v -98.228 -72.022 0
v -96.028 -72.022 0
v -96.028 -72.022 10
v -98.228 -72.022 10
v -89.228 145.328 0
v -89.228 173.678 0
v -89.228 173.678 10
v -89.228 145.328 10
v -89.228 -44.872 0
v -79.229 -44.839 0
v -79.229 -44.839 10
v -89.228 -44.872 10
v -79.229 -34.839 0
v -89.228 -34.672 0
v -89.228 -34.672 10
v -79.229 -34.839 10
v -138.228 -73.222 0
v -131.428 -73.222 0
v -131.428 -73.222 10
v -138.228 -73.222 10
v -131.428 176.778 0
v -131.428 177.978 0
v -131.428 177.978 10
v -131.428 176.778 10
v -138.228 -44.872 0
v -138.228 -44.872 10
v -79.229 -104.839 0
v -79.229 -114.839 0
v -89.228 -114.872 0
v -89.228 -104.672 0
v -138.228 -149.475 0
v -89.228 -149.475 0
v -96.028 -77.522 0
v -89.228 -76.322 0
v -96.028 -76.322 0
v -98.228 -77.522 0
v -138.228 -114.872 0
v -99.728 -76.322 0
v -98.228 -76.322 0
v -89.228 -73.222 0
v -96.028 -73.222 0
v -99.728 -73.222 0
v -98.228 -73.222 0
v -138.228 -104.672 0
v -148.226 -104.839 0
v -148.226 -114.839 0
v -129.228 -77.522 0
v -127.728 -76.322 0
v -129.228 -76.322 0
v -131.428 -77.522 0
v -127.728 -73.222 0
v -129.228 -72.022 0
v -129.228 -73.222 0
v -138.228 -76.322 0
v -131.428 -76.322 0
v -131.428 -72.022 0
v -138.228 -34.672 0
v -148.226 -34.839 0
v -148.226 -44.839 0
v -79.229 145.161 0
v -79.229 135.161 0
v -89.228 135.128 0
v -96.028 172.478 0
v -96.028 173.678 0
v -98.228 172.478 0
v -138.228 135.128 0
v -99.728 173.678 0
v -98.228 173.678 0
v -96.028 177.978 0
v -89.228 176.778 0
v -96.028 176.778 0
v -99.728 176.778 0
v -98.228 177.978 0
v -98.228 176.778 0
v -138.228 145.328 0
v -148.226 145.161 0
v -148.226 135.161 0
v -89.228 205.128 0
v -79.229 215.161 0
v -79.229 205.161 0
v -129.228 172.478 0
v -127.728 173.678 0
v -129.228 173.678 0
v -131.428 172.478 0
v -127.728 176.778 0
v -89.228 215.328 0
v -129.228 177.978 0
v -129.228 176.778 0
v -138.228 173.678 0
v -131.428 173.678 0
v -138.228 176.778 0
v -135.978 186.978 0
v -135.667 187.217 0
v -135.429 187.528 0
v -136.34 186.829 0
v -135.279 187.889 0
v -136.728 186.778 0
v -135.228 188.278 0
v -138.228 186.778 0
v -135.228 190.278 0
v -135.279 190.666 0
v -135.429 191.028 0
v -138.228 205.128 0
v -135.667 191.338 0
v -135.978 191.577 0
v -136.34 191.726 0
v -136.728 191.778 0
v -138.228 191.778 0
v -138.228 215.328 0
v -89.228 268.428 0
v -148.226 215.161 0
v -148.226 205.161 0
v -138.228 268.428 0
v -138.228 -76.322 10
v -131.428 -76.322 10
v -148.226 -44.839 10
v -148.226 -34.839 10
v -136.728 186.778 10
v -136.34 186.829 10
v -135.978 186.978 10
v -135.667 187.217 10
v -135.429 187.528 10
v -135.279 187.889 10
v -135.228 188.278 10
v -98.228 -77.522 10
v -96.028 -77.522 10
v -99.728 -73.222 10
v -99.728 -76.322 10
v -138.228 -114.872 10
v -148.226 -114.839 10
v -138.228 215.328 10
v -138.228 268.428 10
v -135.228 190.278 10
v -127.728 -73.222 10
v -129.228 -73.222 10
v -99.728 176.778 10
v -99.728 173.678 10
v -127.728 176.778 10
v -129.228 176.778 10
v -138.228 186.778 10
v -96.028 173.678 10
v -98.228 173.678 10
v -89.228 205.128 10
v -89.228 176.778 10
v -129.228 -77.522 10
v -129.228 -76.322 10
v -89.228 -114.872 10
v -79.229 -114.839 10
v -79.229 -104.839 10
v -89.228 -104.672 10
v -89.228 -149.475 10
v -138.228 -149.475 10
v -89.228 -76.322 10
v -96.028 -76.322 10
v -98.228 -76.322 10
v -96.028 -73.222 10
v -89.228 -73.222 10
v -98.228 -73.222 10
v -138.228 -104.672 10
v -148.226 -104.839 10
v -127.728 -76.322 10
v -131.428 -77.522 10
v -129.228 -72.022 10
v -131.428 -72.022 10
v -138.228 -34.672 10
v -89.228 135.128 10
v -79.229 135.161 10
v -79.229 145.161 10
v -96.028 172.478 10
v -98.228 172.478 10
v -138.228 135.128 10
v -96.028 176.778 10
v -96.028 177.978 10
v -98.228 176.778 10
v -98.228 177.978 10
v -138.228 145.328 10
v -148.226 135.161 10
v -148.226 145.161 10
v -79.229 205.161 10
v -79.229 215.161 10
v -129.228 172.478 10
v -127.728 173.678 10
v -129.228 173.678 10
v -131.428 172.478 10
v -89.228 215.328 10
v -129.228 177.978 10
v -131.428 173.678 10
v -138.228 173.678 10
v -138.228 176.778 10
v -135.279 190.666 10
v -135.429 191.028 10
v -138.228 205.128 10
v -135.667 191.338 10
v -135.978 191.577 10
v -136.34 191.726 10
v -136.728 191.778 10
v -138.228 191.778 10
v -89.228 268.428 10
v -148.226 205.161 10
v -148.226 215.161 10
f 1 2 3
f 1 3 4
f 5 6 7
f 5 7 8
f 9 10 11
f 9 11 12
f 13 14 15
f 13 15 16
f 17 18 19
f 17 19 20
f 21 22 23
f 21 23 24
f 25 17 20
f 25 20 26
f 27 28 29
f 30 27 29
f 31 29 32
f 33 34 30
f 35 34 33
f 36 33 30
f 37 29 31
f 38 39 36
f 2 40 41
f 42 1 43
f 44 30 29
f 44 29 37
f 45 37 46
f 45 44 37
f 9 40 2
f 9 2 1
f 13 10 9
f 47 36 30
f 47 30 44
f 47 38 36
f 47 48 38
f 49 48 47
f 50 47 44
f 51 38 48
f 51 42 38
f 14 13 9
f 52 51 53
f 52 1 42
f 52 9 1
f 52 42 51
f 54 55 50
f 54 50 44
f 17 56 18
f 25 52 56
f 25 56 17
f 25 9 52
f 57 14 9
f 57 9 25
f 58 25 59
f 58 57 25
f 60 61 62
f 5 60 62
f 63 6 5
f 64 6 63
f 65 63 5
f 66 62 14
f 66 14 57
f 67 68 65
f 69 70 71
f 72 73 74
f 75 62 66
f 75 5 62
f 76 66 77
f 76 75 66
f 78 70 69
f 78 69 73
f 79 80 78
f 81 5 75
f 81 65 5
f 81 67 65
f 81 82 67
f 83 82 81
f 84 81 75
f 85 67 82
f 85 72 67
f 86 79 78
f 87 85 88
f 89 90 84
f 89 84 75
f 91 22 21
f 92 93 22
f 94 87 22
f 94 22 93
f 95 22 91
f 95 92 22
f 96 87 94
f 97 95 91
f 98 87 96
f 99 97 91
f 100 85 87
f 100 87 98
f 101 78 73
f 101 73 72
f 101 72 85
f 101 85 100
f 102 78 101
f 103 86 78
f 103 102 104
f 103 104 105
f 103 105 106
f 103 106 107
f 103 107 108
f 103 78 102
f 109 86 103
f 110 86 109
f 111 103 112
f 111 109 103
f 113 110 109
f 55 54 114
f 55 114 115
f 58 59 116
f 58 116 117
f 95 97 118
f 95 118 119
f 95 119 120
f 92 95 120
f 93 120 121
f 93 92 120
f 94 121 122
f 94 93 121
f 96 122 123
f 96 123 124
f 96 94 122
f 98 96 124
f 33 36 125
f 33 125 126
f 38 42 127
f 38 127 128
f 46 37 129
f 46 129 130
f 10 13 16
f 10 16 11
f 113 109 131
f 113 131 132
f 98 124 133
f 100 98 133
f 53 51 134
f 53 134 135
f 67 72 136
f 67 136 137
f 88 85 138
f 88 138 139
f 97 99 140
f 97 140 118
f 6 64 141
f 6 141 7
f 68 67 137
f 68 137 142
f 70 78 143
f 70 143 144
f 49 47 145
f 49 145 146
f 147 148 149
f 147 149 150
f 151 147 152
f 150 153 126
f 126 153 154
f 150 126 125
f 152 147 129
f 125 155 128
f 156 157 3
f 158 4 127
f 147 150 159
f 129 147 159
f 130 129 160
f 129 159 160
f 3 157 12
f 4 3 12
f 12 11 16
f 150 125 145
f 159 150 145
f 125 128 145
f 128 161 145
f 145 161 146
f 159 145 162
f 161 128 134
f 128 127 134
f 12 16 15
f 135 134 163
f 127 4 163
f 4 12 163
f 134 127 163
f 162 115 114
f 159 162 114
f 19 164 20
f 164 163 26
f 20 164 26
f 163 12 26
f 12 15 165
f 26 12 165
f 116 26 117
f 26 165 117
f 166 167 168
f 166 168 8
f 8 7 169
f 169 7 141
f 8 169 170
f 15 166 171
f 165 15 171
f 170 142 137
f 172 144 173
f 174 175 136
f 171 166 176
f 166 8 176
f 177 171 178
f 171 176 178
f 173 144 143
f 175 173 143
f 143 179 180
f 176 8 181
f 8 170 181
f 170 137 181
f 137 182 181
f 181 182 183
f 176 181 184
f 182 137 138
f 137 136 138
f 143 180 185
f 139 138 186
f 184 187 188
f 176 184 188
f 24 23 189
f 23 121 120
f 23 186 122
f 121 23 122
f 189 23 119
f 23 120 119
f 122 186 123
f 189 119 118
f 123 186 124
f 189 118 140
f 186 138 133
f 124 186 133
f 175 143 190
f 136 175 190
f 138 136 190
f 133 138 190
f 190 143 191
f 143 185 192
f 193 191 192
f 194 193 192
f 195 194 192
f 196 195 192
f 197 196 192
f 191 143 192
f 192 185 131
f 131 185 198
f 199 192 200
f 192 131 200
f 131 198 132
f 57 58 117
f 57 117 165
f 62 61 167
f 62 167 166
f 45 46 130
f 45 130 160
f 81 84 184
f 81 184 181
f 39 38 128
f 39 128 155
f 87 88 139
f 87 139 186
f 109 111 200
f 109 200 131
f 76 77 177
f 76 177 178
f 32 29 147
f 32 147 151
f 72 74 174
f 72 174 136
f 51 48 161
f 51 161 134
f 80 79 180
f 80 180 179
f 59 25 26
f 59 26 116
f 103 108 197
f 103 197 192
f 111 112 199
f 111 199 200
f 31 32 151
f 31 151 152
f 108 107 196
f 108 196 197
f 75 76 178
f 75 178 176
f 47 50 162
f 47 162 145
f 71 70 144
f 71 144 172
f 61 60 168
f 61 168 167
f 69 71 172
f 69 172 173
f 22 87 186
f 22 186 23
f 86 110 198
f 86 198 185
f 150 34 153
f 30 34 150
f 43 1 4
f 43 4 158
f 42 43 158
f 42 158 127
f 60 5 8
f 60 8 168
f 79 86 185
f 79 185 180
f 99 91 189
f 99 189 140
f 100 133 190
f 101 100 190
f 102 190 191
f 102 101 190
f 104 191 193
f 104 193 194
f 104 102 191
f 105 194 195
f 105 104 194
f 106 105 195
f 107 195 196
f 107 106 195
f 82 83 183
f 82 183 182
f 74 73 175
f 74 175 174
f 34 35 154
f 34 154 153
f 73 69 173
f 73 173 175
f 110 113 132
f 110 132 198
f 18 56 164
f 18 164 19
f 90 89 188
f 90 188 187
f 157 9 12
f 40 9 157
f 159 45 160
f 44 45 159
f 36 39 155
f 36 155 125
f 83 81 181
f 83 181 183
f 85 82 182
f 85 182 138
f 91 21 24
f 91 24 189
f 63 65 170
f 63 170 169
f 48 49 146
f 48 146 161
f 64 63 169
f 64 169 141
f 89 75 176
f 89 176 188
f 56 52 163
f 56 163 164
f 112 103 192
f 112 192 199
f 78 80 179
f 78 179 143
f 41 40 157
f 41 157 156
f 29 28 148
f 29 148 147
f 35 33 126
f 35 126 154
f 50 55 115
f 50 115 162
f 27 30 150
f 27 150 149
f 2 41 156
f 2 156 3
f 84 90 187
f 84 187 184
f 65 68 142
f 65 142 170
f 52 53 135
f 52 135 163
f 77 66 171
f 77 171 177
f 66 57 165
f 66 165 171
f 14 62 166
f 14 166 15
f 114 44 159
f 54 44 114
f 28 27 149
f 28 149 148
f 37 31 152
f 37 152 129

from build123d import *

# Parameters (mm, degrees)
EXTRUDE_1_DEPTH = 10


with BuildPart() as part:
    # Эскиз2 → Бобышка-Вытянуть1 (new body)
    with BuildSketch(Plane.XY):
        with BuildLine():
            Line((-89.227881483, -149.474789065), (-138.227881483, -149.474789065))
            Line((-138.227881483, -149.474789065), (-138.227881483, -114.872465065))
            Line((-138.227881483, -114.872465065), (-148.226492884, -114.839108588))
            Line((-148.226492884, -114.839108588), (-148.226492884, -104.839108588))
            Line((-148.226492884, -104.839108588), (-138.227881483, -104.672465065))
            Line((-138.227881483, -104.672465065), (-138.227881483, -76.322465065))
            Line((-138.227881483, -76.322465065), (-131.427881483, -76.322465065))
            Line((-131.427881483, -76.322465065), (-131.427881483, -77.522465065))
            Line((-131.427881483, -77.522465065), (-129.227881483, -77.522465065))
            Line((-129.227881483, -77.522465065), (-129.227881483, -76.322465065))
            Line((-129.227881483, -76.322465065), (-127.727881483, -76.322465065))
            Line((-127.727881483, -76.322465065), (-127.727881483, -73.222465065))
            Line((-127.727881483, -73.222465065), (-129.227881483, -73.222465065))
            Line((-129.227881483, -73.222465065), (-129.227881483, -72.022465065))
            Line((-129.227881483, -72.022465065), (-131.427881483, -72.022465065))
            Line((-131.427881483, -72.022465065), (-131.427881483, -73.222465065))
            Line((-131.427881483, -73.222465065), (-138.227881483, -73.222465065))
            Line((-138.227881483, -73.222465065), (-138.227881483, -44.872465065))
            Line((-138.227881483, -44.872465065), (-148.226492884, -44.839108588))
            Line((-148.226492884, -44.839108588), (-148.226492884, -34.839108588))
            Line((-148.226492884, -34.839108588), (-138.227881483, -34.672465065))
            Line((-138.227881483, -34.672465065), (-138.227881483, 135.127534935))
            Line((-138.227881483, 135.127534935), (-148.226492884, 135.160891412))
            Line((-148.226492884, 135.160891412), (-148.226492884, 145.160891412))
            Line((-148.226492884, 145.160891412), (-138.227881483, 145.327534935))
            Line((-138.227881483, 145.327534935), (-138.227881483, 173.677534935))
            Line((-138.227881483, 173.677534935), (-131.427881483, 173.677534935))
            Line((-131.427881483, 173.677534935), (-131.427881483, 172.477534935))
            Line((-131.427881483, 172.477534935), (-129.227881483, 172.477534935))
            Line((-129.227881483, 172.477534935), (-129.227881483, 173.677534935))
            Line((-129.227881483, 173.677534935), (-127.727881483, 173.677534935))
            Line((-127.727881483, 173.677534935), (-127.727881483, 176.777534935))
            Line((-127.727881483, 176.777534935), (-129.227881483, 176.777534935))
            Line((-129.227881483, 176.777534935), (-129.227881483, 177.977534935))
            Line((-129.227881483, 177.977534935), (-131.427881483, 177.977534935))
            Line((-131.427881483, 177.977534935), (-131.427881483, 176.777534935))
            Line((-131.427881483, 176.777534935), (-138.227881483, 176.777534935))
            Line((-138.227881483, 176.777534935), (-138.227881483, 186.777534935))
            Line((-138.227881483, 186.777534935), (-136.727881483, 186.777534935))
            ThreePointArc((-136.727881483, 186.777534935), (-135.667221312, 187.216874763), (-135.227881483, 188.277534935))
            Line((-135.227881483, 188.277534935), (-135.227881483, 190.277534935))
            ThreePointArc((-135.227881483, 190.277534935), (-135.667221312, 191.338195107), (-136.727881483, 191.777534935))
            Line((-136.727881483, 191.777534935), (-138.227881483, 191.777534935))
            Line((-138.227881483, 191.777534935), (-138.227881483, 205.127534935))
            Line((-138.227881483, 205.127534935), (-148.226492884, 205.160891412))
            Line((-148.226492884, 205.160891412), (-148.226492884, 215.160891412))
            Line((-148.226492884, 215.160891412), (-138.227881483, 215.327534935))
            Line((-138.227881483, 215.327534935), (-138.227881483, 268.427534935))
            Line((-138.227881483, 268.427534935), (-89.227881483, 268.427534935))
            Line((-89.227881483, 268.427534935), (-89.227881483, 215.327534935))
            Line((-89.227881483, 215.327534935), (-79.229270083, 215.160891412))
            Line((-79.229270083, 215.160891412), (-79.229270083, 205.160891412))
            Line((-79.229270083, 205.160891412), (-89.227881483, 205.127534935))
            Line((-89.227881483, 205.127534935), (-89.227881483, 176.777534935))
            Line((-89.227881483, 176.777534935), (-96.027881483, 176.777534935))
            Line((-96.027881483, 176.777534935), (-96.027881483, 177.977534935))
            Line((-96.027881483, 177.977534935), (-98.227881483, 177.977534935))
            Line((-98.227881483, 177.977534935), (-98.227881483, 176.777534935))
            Line((-98.227881483, 176.777534935), (-99.727881483, 176.777534935))
            Line((-99.727881483, 176.777534935), (-99.727881483, 173.677534935))
            Line((-99.727881483, 173.677534935), (-98.227881483, 173.677534935))
            Line((-98.227881483, 173.677534935), (-98.227881483, 172.477534935))
            Line((-98.227881483, 172.477534935), (-96.027881483, 172.477534935))
            Line((-96.027881483, 172.477534935), (-96.027881483, 173.677534935))
            Line((-96.027881483, 173.677534935), (-89.227881483, 173.677534935))
            Line((-89.227881483, 173.677534935), (-89.227881483, 145.327534935))
            Line((-89.227881483, 145.327534935), (-79.229270083, 145.160891412))
            Line((-79.229270083, 145.160891412), (-79.229270083, 135.160891412))
            Line((-79.229270083, 135.160891412), (-89.227881483, 135.127534935))
            Line((-89.227881483, 135.127534935), (-89.227881483, -34.672465065))
            Line((-89.227881483, -34.672465065), (-79.229270083, -34.839108588))
            Line((-79.229270083, -34.839108588), (-79.229270083, -44.839108588))
            Line((-79.229270083, -44.839108588), (-89.227881483, -44.872465065))
            Line((-89.227881483, -44.872465065), (-89.227881483, -73.222465065))
            Line((-89.227881483, -73.222465065), (-96.027881483, -73.222465065))
            Line((-96.027881483, -73.222465065), (-96.027881483, -72.022465065))
            Line((-96.027881483, -72.022465065), (-98.227881483, -72.022465065))
            Line((-98.227881483, -72.022465065), (-98.227881483, -73.222465065))
            Line((-98.227881483, -73.222465065), (-99.727881483, -73.222465065))
            Line((-99.727881483, -73.222465065), (-99.727881483, -76.322465065))
            Line((-99.727881483, -76.322465065), (-98.227881483, -76.322465065))
            Line((-98.227881483, -76.322465065), (-98.227881483, -77.522465065))
            Line((-98.227881483, -77.522465065), (-96.027881483, -77.522465065))
            Line((-96.027881483, -77.522465065), (-96.027881483, -76.322465065))
            Line((-96.027881483, -76.322465065), (-89.227881483, -76.322465065))
            Line((-89.227881483, -76.322465065), (-89.227881483, -104.672465065))
            Line((-89.227881483, -104.672465065), (-79.229270083, -104.839108588))
            Line((-79.229270083, -104.839108588), (-79.229270083, -114.839108588))
            Line((-79.229270083, -114.839108588), (-89.227881483, -114.872465065))
            Line((-89.227881483, -114.872465065), (-89.227881483, -149.474789065))
        make_face()
    extrude(amount=EXTRUDE_1_DEPTH)


solid = part.part
